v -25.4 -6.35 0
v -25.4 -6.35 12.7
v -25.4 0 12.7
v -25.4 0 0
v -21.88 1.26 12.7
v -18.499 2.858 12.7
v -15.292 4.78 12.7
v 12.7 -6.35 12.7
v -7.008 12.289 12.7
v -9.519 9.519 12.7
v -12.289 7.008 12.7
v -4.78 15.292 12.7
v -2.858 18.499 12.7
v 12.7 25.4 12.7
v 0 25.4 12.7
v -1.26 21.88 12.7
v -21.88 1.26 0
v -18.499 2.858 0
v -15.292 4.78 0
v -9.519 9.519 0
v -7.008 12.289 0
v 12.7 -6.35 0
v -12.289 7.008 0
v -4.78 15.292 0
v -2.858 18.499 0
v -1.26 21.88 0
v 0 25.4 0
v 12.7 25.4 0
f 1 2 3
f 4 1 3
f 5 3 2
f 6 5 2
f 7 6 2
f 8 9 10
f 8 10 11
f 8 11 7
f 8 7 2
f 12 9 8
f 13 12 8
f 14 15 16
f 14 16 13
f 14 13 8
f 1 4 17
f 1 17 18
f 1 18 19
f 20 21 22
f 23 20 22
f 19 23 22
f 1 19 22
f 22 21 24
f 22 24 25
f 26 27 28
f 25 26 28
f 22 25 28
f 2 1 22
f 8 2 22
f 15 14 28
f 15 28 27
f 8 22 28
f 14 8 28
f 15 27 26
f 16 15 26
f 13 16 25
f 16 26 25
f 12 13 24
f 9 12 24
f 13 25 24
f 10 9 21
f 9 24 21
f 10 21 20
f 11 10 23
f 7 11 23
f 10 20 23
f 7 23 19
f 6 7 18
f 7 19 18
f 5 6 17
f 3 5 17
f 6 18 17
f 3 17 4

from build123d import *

# Parameters (mm, degrees)
F0_W     = 25.4
F0_H     = 6.35
F1_DEPTH = 12.7


with BuildPart() as f1:
    # F0 (on Top) → F1 (new body)
    with BuildSketch(Plane.XY):
        with BuildLine():
            Line((0, 0), (0, 25.4))
            ThreePointArc((0, 25.4), (-9.518756, 9.518756), (-25.4, 0))
            Line((-25.4, 0), (0, 0))
        make_face()
        Polygon((12.7, 25.4), (0, 25.4), (0, 0), (0, -6.35), (12.7, -6.35), align=None)
        with Locations((-12.7, -3.175)):
            Rectangle(F0_W, F0_H)
    extrude(amount=F1_DEPTH)


solid = f1.part
